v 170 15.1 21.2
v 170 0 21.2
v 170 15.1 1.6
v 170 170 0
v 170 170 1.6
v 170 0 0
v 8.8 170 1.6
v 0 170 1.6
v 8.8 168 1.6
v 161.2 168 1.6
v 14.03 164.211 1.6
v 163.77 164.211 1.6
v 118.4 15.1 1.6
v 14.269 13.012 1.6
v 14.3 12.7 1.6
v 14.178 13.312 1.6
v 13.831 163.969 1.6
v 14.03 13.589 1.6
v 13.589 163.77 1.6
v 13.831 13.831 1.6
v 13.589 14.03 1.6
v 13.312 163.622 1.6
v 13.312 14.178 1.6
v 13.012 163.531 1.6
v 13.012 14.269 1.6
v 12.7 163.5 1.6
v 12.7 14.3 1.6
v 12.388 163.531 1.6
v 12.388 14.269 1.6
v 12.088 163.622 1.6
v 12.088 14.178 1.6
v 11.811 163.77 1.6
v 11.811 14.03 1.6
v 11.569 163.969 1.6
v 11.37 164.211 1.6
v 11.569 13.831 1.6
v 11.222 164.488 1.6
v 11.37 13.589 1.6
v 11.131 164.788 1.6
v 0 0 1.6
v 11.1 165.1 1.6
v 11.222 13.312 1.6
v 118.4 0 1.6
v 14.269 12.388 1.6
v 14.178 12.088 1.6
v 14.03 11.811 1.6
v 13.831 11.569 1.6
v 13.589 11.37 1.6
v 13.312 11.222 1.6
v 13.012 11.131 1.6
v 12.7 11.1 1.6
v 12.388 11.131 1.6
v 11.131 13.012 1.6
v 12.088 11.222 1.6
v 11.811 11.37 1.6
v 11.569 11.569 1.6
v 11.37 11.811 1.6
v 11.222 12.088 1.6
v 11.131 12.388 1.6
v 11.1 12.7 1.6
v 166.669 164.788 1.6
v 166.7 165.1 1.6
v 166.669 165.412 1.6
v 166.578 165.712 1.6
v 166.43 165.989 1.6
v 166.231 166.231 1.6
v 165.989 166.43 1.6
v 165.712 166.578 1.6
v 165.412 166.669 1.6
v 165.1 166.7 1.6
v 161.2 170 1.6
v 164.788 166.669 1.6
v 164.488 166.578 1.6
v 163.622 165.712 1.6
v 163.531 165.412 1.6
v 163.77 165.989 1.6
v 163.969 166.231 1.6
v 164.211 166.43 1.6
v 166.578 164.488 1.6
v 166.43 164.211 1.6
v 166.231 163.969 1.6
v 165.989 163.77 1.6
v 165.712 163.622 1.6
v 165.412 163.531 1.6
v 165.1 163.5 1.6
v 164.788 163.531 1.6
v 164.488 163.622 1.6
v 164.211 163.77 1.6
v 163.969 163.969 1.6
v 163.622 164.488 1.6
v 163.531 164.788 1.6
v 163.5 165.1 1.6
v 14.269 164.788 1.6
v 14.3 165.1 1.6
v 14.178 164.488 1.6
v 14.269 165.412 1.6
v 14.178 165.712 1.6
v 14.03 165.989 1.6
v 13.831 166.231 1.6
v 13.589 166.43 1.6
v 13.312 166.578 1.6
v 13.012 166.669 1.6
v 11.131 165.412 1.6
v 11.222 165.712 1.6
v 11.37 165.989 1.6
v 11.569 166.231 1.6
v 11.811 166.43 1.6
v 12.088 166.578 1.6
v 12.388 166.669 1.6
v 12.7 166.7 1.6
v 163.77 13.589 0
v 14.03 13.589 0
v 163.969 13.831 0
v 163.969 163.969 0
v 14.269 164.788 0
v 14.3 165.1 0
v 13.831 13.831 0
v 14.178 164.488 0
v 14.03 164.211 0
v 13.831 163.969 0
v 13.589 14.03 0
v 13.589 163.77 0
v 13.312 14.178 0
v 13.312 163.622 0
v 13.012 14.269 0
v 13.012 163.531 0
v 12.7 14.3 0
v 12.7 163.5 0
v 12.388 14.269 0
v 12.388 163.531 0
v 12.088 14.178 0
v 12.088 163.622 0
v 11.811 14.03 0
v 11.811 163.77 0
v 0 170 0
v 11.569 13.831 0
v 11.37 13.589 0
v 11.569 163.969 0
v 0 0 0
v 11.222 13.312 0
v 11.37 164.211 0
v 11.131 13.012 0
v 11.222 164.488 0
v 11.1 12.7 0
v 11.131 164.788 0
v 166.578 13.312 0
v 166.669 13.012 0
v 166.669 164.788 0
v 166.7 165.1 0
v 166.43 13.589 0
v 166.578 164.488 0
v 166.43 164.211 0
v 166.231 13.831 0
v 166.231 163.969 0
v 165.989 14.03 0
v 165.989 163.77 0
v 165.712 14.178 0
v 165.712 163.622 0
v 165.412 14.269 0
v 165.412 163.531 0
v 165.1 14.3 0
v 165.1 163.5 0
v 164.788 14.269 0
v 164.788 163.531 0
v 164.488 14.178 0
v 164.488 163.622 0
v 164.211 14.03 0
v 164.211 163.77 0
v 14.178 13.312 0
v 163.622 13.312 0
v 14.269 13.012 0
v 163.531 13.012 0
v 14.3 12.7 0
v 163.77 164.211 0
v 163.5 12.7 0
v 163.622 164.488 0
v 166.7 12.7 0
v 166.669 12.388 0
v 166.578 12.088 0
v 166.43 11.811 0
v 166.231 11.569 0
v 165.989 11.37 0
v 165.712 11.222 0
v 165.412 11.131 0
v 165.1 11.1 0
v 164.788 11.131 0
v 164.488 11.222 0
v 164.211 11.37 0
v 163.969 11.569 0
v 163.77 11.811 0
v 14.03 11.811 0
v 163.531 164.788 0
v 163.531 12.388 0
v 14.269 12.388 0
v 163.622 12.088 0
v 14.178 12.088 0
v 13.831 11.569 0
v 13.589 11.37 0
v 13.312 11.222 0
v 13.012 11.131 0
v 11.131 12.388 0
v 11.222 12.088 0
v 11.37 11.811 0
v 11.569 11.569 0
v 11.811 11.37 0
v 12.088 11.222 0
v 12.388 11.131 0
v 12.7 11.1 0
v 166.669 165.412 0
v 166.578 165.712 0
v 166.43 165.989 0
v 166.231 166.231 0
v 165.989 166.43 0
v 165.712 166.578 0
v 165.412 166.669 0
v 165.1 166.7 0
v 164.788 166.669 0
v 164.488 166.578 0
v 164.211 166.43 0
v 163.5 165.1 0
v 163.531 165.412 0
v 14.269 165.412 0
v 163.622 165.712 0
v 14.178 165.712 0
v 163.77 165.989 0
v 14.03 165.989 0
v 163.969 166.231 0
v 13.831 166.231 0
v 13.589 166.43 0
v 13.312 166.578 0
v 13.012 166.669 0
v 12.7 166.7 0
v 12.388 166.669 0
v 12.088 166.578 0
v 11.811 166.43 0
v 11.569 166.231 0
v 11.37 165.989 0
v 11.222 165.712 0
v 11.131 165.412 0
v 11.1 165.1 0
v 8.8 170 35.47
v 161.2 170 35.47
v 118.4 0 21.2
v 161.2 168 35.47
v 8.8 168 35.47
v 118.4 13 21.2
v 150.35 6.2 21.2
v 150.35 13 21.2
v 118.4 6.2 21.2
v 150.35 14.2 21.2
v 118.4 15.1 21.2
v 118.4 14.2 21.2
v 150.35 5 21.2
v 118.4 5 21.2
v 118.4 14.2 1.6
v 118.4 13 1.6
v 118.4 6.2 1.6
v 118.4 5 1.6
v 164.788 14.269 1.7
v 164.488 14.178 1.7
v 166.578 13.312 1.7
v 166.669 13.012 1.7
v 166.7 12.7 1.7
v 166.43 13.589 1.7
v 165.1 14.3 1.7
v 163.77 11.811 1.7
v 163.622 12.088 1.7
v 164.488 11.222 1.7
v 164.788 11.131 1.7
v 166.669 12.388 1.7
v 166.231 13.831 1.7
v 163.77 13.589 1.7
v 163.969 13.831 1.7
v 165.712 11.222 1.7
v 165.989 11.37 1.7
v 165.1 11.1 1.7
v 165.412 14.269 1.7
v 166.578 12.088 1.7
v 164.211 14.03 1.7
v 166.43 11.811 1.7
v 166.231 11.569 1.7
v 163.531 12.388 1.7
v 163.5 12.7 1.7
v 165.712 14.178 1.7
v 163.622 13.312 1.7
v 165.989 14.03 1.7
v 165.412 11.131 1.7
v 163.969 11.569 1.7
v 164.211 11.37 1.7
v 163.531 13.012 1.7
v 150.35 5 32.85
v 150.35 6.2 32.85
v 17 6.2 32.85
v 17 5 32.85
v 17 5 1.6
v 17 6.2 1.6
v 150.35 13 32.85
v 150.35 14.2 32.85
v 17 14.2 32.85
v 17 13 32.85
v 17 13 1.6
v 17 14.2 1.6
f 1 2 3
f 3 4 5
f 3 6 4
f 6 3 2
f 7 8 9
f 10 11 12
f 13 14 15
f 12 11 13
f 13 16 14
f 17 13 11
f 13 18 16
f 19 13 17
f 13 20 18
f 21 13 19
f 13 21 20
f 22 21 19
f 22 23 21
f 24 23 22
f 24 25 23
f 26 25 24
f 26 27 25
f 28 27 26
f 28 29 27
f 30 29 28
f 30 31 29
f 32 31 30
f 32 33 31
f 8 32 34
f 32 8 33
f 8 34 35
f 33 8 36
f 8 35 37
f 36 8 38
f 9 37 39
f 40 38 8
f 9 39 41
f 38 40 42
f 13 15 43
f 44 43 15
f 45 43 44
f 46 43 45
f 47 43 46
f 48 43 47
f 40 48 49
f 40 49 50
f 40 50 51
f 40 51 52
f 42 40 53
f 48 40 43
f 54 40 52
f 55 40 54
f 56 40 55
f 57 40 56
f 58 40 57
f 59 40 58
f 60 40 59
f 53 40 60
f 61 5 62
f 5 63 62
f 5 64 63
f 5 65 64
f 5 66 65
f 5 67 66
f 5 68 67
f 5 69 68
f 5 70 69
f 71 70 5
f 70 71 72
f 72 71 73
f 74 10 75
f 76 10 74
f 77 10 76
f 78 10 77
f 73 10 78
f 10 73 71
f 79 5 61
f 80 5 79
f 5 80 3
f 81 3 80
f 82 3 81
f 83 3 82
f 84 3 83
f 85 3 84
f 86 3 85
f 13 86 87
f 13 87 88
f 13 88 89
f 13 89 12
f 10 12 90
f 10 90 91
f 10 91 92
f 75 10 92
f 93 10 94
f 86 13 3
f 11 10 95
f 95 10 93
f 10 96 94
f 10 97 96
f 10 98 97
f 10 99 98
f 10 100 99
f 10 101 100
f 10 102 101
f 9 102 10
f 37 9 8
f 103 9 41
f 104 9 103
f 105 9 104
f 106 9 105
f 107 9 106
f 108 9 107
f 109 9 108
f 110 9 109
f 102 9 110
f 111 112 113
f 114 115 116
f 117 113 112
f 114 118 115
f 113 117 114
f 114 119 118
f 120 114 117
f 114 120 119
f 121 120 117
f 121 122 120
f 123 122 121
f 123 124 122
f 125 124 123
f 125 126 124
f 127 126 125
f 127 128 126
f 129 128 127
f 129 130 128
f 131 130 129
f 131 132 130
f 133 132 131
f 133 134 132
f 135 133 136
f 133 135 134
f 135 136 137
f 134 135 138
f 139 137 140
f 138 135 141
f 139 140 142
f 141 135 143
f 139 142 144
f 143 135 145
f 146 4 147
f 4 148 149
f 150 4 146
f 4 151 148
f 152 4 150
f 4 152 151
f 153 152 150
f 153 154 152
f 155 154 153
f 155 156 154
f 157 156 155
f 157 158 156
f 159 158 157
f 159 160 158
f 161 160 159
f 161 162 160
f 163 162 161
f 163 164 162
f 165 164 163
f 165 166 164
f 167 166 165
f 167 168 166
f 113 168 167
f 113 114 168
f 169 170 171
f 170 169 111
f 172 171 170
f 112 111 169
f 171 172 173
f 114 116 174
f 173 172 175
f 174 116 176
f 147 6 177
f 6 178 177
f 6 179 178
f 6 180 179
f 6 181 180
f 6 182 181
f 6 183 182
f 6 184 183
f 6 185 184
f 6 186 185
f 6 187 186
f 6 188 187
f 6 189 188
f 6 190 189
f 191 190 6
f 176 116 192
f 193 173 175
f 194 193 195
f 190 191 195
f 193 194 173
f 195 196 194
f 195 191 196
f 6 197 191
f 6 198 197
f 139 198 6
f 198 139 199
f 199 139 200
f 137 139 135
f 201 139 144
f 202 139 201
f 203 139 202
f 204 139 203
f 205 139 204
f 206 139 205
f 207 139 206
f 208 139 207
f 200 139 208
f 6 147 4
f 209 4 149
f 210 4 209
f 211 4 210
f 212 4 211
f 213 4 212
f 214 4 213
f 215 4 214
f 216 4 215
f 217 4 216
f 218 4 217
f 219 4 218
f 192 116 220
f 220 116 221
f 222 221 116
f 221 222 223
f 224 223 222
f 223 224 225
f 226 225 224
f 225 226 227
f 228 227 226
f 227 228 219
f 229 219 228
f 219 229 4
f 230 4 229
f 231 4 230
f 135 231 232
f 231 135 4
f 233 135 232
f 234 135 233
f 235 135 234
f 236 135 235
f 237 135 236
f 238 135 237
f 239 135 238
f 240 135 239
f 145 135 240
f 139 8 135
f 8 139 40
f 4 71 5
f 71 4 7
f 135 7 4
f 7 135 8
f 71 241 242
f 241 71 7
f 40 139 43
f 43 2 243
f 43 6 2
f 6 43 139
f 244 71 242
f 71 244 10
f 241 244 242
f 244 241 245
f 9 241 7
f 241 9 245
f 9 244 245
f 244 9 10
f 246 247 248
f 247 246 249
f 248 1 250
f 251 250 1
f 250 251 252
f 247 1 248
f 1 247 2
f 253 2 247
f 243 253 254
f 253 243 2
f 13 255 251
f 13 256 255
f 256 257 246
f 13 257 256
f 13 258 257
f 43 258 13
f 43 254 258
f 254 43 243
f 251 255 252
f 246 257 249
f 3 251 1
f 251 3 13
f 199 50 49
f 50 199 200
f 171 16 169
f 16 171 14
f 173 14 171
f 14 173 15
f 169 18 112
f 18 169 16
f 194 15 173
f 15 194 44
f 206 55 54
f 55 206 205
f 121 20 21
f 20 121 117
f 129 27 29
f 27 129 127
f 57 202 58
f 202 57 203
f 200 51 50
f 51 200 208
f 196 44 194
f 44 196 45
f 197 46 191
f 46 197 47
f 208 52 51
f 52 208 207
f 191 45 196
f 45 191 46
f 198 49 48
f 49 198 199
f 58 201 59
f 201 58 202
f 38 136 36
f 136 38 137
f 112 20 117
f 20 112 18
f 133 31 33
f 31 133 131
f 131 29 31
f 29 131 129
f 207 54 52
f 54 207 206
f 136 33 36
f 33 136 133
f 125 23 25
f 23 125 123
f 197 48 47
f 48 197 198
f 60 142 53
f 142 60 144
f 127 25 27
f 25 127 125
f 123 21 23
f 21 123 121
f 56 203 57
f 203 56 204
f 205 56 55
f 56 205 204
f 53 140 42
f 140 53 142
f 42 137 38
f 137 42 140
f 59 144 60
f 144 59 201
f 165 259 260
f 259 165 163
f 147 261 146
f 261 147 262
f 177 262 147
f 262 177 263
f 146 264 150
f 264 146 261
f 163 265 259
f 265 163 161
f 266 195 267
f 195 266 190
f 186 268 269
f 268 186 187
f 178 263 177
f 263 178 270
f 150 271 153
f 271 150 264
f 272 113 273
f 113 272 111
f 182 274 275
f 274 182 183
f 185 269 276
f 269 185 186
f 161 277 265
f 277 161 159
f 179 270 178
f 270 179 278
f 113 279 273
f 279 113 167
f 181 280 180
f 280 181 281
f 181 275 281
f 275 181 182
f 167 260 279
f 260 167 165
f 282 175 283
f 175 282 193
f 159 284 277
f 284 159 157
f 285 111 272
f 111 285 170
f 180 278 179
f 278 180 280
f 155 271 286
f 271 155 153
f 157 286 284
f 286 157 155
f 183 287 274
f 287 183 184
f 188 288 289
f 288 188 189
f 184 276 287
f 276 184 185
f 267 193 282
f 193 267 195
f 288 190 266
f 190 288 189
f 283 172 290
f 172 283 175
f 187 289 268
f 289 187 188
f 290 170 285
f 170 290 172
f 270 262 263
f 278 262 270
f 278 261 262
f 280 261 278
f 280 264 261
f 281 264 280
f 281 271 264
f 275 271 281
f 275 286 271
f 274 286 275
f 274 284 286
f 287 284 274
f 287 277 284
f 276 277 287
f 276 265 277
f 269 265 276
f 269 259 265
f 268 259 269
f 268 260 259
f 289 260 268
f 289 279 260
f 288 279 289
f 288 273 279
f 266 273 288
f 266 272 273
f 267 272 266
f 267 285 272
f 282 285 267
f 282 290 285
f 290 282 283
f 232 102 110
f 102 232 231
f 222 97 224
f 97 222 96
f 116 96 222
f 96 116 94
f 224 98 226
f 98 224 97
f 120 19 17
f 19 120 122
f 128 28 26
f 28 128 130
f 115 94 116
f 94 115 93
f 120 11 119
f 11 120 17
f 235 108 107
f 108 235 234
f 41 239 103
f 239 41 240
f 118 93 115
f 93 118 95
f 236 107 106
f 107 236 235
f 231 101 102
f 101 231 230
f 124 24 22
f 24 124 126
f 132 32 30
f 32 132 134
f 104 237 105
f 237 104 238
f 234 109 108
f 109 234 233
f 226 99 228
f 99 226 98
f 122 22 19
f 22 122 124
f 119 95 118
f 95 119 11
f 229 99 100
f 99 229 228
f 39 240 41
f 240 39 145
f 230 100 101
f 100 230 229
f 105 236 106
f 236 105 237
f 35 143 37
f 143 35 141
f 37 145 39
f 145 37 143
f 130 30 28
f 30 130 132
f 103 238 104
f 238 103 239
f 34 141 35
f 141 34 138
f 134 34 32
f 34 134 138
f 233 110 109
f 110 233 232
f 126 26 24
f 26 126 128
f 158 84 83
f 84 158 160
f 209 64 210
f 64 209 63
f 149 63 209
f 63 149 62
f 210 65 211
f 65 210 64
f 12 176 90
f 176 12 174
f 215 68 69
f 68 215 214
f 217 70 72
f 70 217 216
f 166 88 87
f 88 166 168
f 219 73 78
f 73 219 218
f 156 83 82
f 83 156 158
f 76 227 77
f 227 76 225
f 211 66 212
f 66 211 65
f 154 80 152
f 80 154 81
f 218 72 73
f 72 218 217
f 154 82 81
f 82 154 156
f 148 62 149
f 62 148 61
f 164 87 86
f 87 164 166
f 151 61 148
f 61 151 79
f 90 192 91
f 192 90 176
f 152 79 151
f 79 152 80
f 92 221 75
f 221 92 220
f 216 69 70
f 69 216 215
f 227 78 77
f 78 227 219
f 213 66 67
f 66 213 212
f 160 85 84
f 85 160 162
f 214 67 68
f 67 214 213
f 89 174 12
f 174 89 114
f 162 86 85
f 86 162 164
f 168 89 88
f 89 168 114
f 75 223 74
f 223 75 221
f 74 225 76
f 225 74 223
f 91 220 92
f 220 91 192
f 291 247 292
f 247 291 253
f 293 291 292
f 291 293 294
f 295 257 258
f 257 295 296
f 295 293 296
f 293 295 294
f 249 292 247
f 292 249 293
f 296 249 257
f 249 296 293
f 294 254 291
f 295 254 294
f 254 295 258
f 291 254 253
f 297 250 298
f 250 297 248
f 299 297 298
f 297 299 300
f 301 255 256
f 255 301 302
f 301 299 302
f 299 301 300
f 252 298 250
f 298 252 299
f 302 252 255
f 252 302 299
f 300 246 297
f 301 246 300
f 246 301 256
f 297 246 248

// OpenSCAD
// file: ../../case/dimensions.scad
// Shared dimensions for all case components
// This file defines common parameters used across multiple case parts

// --- Wall and Material ---
wall_thickness = 3;

// --- Motherboard (Mini-ITX) ---
mobo_width = 170;
mobo_depth = 170;
mobo_pcb_thickness = 1.6;

// --- Standoffs ---
standoff_height = 6;  // Female thread portion of M3x10+6mm male-female standoff
standoff_hole_radius = 1.6;  // M3 clearance (deprecated - see integrated bottom panel design)
standoff_locations = [
    [12.7, 12.7],
    [165.1, 12.7],
    [12.7, 165.1],
    [165.1, 165.1]
];

// --- Standoff Hexagonal Receptacles (Integrated Bottom Panel Design) ---
standoff_boss_height = 2.5;              // Height of hex boss above panel interior surface
standoff_hex_size_flat_to_flat = 5.5;   // Hex size for M3 screw head (flat-to-flat)
standoff_hex_size_point_to_point = 6.35; // Hex size point-to-point (calculated from F-F)
standoff_pocket_depth = 2.2;             // Depth of hex recess for screw head
standoff_boss_diameter = 6.85;           // Overall boss diameter (hex point + FDM tolerance)
standoff_mounting_screw_length = 8;      // M3 x 8mm cap screw (recommended)
standoff_screw_clearance_hole = 3.3;     // M3 clearance hole + FDM tolerance

// --- I/O Shield ---
// Standard ATX I/O shield dimensions
io_shield_width = 158.75;   // 6.25 inches (standard ATX)
io_shield_height = 44.45;   // 1.75 inches (standard ATX)
io_shield_x_offset = (mobo_width - io_shield_width) / 2;
io_shield_z_offset = 5;     // 5mm from bottom of plate

// --- Backplate ---
backplate_height = 88.9;    // 3.5 inches
backplate_thickness = wall_thickness;

// --- CPU Cooler (Noctua NH-L12S) - Minimal/NAS configurations ---
cooler_width = 128;
cooler_depth = 146;
cooler_base_height = 35;      // Base plate and heatpipes
cooler_fan_height = 15;       // 120mm x 15mm fan (NF-A12x15)
cooler_fins_height = 20;      // Heatsink fins on top
cooler_total_height = cooler_base_height + cooler_fan_height + cooler_fins_height;  // 70mm

// --- CPU Cooler (Noctua NH-L9) - Pico configuration ---
cooler_nh_l9_width = 95;
cooler_nh_l9_depth = 95;
cooler_nh_l9_base_height = 5;       // CPU contact base
cooler_nh_l9_heatsink_height = 18;  // Aluminum fins
cooler_nh_l9_fan_height = 14;       // 92mm x 14mm fan
cooler_nh_l9_total_height = cooler_nh_l9_base_height + cooler_nh_l9_heatsink_height + cooler_nh_l9_fan_height;  // 37mm

// --- Power Supplies ---
// Flex ATX (from technical drawing)
// Standing orientation: 40mm wide (X), 150mm deep (Y), 80mm tall (Z)
flex_atx_width = 40.0;      // A: Width (X - thin side, standing)
flex_atx_length = 150.0;    // B: Length (Y - depth)
flex_atx_height = 80.0;     // G: Height (Z - tall side, standing)

// Flex ATX Mounting holes - 8-32 UNC thread (4 places on rear 40x80mm face)
flex_atx_mount_hole_radius = 2.1;   // 8-32 clearance (~4.2mm dia)
flex_atx_mount_x_inset = 5;         // Distance from left/right edges (corrected from 12.5)
flex_atx_mount_z_inset = 5;         // Distance from top/bottom edges (corrected from 8.25)

// Calculated mounting hole positions (X, Z pairs relative to PSU origin)
// Note: Only 3 holes - top-right (coords) removed where C14 inlet is located
// When viewing from back: top-right (coords) = top-left (view)
flex_atx_mount_holes = [
    [flex_atx_mount_x_inset, flex_atx_mount_z_inset],                                    // Bottom-left (coords) = Bottom-right (view)
    [flex_atx_width - flex_atx_mount_x_inset, flex_atx_mount_z_inset],                   // Bottom-right (coords) = Bottom-left (view)
    [flex_atx_mount_x_inset, flex_atx_height - flex_atx_mount_z_inset]                   // Top-left (coords) = Top-right (view)
    // Top-right (coords) removed - C14 power inlet is here = Top-left (view)
];

// SFX
sfx_length = 125;
sfx_width = 100;
sfx_height = 63.5;

// --- HDD 3.5" Dimensions ---
hdd_width = 101.6;
hdd_length = 147;
hdd_height = 26.1;

// --- NAS 2-Disk Config ---
// 2 HDDs side-by-side (controlling dimension for case width)
// See SPEC.md Section 3.3 for design rationale
nas_2disk_rail_width = 2;
nas_2disk_gap = 5;           // Gap between bays
nas_2disk_padding = 2;       // Clearance around HDDs
nas_2disk_bay_width = hdd_width + 2 * nas_2disk_rail_width;  // ~105.6mm per bay
nas_2disk_inner_width = 2 * nas_2disk_bay_width + nas_2disk_gap;  // ~216.2mm
nas_2disk_width = nas_2disk_inner_width + 2 * (wall_thickness + nas_2disk_padding);  // ~226mm

// --- PSU Compartment ---
// Flex ATX PSU in standing orientation (40mm width)
flex_atx_standing_width = flex_atx_width;  // 40mm (already in standing orientation)
psu_compartment_width = nas_2disk_width - mobo_width;  // ~56mm (40mm PSU + 16mm clearance)

// --- Interior Chamber Height (standoffs + motherboard + cooler) ---
interior_chamber_height = standoff_height + mobo_pcb_thickness + cooler_total_height;  // ~94mm

// --- Minimal Config External Dimensions ---
// Motherboard area only (without PSU)
minimal_mobo_exterior_width = mobo_width + 2 * wall_thickness;   // 176mm
minimal_mobo_exterior_depth = mobo_depth + 2 * wall_thickness;   // 176mm
minimal_exterior_height = interior_chamber_height + 2 * wall_thickness;   // ~100mm

// With Flex ATX PSU next to motherboard
// Width controlled by NAS 2-disk HDD layout (see SPEC.md Section 3.3)
minimal_with_psu_width = nas_2disk_width;  // ~226mm (PSU compartment = 56mm, PSU on side = 40mm)

// --- Interior Panel Dimensions (top/bottom panels fit between walls) ---
interior_panel_width = minimal_with_psu_width - 2 * wall_thickness;  // ~220mm
interior_panel_depth = mobo_depth;                                    // 170mm

// --- Side Panel Dimensions (left/right panels form exterior walls) ---
side_panel_height = minimal_exterior_height;                          // ~100mm
side_panel_depth = mobo_depth + 2 * wall_thickness;                   // 176mm

// --- Front/Back Panel Dimensions (fit between side walls, full exterior height) ---
front_back_panel_width = interior_panel_width;                        // ~220mm
front_back_panel_height = side_panel_height;                          // ~100mm (full exterior)

// --- Ventilation ---
honeycomb_radius = 3;
vent_padding = 5;

// --- Screw Holes for Panel Assembly ---
panel_screw_radius = 1.6;  // M3
panel_screw_inset = 8;     // Distance from edge

// --- GPU ---
gpu_length = 320;          // Max GPU length
gpu_height = 140;          // GPU PCB + cooler height
gpu_width = 60;            // 3 slots

// --- GPU Config External Dimensions ---
// From SPEC.md Section 8.4
gpu_config_width = 171;    // mm
gpu_config_depth = 378;    // mm
gpu_config_height = 190;   // mm

// --- Fans ---
fan_120_size = 120;
fan_120_thickness = 25;
fan_140_size = 140;
fan_140_thickness = 25;

// --- AIO Radiator ---
radiator_240_length = 275;
radiator_240_width = 120;
radiator_240_thickness = 27;

// --- NAS Many-Disk Config ---
// 5-8 drives mounted vertically (on narrowest side)
nas_many_drive_count = 6;  // Default 6 drives
nas_many_drive_spacing = 5;
nas_many_enclosure_height = hdd_width + wall_thickness + 5;  // ~110mm (drives on side)

// --- Power Inlet C14 ---
c14_width = 50;
c14_height = 27;
c14_depth = 30;

// --- Open Air Frame ---
// Frame cylinder height (from motherboard surface to inside panel face)
// Derived: interior_chamber_height - standoff_height - mobo_pcb_thickness
frame_cylinder_height = interior_chamber_height - standoff_height - mobo_pcb_thickness;  // ~86mm
frame_cylinder_outer_diameter = 8;     // Outer diameter
frame_cylinder_inner_diameter = 3.2;   // M3 clearance for standoff stud
frame_cylinder_thread_depth = 6;       // Matches extended_standoff_male_height (M3x6+6mm)
// file: ../ram.scad
// A module for a single DDR4 RAM stick
module ram_stick() {
    ram_l = 133.35;
    ram_h = 31.25;
    ram_t = 1.2;
    cube([ram_l, ram_t, ram_h]);
}
// file: motherboard.scad
// A module to create a rudimentary Mini-ITX motherboard model
// Includes mounting holes at standard Mini-ITX positions
// Note: Standoffs are now part of base_assembly, not the motherboard module

include <../../case/dimensions.scad>

module motherboard() {
    mobo_width = 170;
    mobo_depth = 170;
    mobo_thickness = 1.6;

    io_shield_width = 152.4;
    io_shield_height = 33.87;
    io_shield_thickness = 2;
    io_shield_x_offset = (mobo_width - io_shield_width) / 2;

    // ATX 24-pin connector dimensions
    atx_conn_l = 51.6;
    atx_conn_w = 15.1;
    atx_conn_h = 19.6;

    union() {
        // Motherboard PCB with mounting holes
        color("purple") {
            difference() {
                union() {
                    // Motherboard PCB
                    cube([mobo_width, mobo_depth, mobo_thickness]);
                    // I/O Shield
                    translate([io_shield_x_offset, mobo_depth - io_shield_thickness, mobo_thickness]) {
                        cube([io_shield_width, io_shield_thickness, io_shield_height]);
                    }
                    // 24-pin ATX Connector
                    translate([mobo_width - atx_conn_l, 0, mobo_thickness]) {
                        cube([atx_conn_l, atx_conn_w, atx_conn_h]);
                    }
                }
                // Mounting holes at Mini-ITX standoff locations
                for (pos = standoff_locations) {
                    translate([pos[0], pos[1], -0.1]) {
                        cylinder(h = mobo_thickness + 0.2, r = standoff_hole_radius, $fn = 32);
                    }
                }
            }
        }

        // Note: Standoffs removed from motherboard module (legacy code)
        // Standoffs are now part of base_assembly (integrated bottom panel design)
        // See modules/case/base/base_assembly.scad
    }
}

// Preview
motherboard();
// main file
// Motherboard with RAM Assembly
// Contains: Mini-ITX motherboard + 2x RAM sticks
// Use this as foundation for cooler-specific assemblies
//
// Coordinate System:
// X-axis: 0 = left side, increases toward right
// Y-axis: 0 = front, increases toward back
// Z-axis: 0 = bottom of motherboard PCB, increases upward

use <motherboard.scad>
use <../ram.scad>

// Motherboard PCB thickness (needed for component positioning)
mobo_pcb_thickness = 1.6;

module motherboard_with_ram() {
    union() {
        // Motherboard PCB with I/O shield
        motherboard();

        // RAM (2 sticks, 5mm from front, 17mm from left of motherboard)
        // Stick spacing: 8mm between sticks
        translate([17, 5, mobo_pcb_thickness]) {
            ram_stick();
            translate([0, 8, 0]) {
                ram_stick();
            }
        }
    }
}

// Preview
motherboard_with_ram();
